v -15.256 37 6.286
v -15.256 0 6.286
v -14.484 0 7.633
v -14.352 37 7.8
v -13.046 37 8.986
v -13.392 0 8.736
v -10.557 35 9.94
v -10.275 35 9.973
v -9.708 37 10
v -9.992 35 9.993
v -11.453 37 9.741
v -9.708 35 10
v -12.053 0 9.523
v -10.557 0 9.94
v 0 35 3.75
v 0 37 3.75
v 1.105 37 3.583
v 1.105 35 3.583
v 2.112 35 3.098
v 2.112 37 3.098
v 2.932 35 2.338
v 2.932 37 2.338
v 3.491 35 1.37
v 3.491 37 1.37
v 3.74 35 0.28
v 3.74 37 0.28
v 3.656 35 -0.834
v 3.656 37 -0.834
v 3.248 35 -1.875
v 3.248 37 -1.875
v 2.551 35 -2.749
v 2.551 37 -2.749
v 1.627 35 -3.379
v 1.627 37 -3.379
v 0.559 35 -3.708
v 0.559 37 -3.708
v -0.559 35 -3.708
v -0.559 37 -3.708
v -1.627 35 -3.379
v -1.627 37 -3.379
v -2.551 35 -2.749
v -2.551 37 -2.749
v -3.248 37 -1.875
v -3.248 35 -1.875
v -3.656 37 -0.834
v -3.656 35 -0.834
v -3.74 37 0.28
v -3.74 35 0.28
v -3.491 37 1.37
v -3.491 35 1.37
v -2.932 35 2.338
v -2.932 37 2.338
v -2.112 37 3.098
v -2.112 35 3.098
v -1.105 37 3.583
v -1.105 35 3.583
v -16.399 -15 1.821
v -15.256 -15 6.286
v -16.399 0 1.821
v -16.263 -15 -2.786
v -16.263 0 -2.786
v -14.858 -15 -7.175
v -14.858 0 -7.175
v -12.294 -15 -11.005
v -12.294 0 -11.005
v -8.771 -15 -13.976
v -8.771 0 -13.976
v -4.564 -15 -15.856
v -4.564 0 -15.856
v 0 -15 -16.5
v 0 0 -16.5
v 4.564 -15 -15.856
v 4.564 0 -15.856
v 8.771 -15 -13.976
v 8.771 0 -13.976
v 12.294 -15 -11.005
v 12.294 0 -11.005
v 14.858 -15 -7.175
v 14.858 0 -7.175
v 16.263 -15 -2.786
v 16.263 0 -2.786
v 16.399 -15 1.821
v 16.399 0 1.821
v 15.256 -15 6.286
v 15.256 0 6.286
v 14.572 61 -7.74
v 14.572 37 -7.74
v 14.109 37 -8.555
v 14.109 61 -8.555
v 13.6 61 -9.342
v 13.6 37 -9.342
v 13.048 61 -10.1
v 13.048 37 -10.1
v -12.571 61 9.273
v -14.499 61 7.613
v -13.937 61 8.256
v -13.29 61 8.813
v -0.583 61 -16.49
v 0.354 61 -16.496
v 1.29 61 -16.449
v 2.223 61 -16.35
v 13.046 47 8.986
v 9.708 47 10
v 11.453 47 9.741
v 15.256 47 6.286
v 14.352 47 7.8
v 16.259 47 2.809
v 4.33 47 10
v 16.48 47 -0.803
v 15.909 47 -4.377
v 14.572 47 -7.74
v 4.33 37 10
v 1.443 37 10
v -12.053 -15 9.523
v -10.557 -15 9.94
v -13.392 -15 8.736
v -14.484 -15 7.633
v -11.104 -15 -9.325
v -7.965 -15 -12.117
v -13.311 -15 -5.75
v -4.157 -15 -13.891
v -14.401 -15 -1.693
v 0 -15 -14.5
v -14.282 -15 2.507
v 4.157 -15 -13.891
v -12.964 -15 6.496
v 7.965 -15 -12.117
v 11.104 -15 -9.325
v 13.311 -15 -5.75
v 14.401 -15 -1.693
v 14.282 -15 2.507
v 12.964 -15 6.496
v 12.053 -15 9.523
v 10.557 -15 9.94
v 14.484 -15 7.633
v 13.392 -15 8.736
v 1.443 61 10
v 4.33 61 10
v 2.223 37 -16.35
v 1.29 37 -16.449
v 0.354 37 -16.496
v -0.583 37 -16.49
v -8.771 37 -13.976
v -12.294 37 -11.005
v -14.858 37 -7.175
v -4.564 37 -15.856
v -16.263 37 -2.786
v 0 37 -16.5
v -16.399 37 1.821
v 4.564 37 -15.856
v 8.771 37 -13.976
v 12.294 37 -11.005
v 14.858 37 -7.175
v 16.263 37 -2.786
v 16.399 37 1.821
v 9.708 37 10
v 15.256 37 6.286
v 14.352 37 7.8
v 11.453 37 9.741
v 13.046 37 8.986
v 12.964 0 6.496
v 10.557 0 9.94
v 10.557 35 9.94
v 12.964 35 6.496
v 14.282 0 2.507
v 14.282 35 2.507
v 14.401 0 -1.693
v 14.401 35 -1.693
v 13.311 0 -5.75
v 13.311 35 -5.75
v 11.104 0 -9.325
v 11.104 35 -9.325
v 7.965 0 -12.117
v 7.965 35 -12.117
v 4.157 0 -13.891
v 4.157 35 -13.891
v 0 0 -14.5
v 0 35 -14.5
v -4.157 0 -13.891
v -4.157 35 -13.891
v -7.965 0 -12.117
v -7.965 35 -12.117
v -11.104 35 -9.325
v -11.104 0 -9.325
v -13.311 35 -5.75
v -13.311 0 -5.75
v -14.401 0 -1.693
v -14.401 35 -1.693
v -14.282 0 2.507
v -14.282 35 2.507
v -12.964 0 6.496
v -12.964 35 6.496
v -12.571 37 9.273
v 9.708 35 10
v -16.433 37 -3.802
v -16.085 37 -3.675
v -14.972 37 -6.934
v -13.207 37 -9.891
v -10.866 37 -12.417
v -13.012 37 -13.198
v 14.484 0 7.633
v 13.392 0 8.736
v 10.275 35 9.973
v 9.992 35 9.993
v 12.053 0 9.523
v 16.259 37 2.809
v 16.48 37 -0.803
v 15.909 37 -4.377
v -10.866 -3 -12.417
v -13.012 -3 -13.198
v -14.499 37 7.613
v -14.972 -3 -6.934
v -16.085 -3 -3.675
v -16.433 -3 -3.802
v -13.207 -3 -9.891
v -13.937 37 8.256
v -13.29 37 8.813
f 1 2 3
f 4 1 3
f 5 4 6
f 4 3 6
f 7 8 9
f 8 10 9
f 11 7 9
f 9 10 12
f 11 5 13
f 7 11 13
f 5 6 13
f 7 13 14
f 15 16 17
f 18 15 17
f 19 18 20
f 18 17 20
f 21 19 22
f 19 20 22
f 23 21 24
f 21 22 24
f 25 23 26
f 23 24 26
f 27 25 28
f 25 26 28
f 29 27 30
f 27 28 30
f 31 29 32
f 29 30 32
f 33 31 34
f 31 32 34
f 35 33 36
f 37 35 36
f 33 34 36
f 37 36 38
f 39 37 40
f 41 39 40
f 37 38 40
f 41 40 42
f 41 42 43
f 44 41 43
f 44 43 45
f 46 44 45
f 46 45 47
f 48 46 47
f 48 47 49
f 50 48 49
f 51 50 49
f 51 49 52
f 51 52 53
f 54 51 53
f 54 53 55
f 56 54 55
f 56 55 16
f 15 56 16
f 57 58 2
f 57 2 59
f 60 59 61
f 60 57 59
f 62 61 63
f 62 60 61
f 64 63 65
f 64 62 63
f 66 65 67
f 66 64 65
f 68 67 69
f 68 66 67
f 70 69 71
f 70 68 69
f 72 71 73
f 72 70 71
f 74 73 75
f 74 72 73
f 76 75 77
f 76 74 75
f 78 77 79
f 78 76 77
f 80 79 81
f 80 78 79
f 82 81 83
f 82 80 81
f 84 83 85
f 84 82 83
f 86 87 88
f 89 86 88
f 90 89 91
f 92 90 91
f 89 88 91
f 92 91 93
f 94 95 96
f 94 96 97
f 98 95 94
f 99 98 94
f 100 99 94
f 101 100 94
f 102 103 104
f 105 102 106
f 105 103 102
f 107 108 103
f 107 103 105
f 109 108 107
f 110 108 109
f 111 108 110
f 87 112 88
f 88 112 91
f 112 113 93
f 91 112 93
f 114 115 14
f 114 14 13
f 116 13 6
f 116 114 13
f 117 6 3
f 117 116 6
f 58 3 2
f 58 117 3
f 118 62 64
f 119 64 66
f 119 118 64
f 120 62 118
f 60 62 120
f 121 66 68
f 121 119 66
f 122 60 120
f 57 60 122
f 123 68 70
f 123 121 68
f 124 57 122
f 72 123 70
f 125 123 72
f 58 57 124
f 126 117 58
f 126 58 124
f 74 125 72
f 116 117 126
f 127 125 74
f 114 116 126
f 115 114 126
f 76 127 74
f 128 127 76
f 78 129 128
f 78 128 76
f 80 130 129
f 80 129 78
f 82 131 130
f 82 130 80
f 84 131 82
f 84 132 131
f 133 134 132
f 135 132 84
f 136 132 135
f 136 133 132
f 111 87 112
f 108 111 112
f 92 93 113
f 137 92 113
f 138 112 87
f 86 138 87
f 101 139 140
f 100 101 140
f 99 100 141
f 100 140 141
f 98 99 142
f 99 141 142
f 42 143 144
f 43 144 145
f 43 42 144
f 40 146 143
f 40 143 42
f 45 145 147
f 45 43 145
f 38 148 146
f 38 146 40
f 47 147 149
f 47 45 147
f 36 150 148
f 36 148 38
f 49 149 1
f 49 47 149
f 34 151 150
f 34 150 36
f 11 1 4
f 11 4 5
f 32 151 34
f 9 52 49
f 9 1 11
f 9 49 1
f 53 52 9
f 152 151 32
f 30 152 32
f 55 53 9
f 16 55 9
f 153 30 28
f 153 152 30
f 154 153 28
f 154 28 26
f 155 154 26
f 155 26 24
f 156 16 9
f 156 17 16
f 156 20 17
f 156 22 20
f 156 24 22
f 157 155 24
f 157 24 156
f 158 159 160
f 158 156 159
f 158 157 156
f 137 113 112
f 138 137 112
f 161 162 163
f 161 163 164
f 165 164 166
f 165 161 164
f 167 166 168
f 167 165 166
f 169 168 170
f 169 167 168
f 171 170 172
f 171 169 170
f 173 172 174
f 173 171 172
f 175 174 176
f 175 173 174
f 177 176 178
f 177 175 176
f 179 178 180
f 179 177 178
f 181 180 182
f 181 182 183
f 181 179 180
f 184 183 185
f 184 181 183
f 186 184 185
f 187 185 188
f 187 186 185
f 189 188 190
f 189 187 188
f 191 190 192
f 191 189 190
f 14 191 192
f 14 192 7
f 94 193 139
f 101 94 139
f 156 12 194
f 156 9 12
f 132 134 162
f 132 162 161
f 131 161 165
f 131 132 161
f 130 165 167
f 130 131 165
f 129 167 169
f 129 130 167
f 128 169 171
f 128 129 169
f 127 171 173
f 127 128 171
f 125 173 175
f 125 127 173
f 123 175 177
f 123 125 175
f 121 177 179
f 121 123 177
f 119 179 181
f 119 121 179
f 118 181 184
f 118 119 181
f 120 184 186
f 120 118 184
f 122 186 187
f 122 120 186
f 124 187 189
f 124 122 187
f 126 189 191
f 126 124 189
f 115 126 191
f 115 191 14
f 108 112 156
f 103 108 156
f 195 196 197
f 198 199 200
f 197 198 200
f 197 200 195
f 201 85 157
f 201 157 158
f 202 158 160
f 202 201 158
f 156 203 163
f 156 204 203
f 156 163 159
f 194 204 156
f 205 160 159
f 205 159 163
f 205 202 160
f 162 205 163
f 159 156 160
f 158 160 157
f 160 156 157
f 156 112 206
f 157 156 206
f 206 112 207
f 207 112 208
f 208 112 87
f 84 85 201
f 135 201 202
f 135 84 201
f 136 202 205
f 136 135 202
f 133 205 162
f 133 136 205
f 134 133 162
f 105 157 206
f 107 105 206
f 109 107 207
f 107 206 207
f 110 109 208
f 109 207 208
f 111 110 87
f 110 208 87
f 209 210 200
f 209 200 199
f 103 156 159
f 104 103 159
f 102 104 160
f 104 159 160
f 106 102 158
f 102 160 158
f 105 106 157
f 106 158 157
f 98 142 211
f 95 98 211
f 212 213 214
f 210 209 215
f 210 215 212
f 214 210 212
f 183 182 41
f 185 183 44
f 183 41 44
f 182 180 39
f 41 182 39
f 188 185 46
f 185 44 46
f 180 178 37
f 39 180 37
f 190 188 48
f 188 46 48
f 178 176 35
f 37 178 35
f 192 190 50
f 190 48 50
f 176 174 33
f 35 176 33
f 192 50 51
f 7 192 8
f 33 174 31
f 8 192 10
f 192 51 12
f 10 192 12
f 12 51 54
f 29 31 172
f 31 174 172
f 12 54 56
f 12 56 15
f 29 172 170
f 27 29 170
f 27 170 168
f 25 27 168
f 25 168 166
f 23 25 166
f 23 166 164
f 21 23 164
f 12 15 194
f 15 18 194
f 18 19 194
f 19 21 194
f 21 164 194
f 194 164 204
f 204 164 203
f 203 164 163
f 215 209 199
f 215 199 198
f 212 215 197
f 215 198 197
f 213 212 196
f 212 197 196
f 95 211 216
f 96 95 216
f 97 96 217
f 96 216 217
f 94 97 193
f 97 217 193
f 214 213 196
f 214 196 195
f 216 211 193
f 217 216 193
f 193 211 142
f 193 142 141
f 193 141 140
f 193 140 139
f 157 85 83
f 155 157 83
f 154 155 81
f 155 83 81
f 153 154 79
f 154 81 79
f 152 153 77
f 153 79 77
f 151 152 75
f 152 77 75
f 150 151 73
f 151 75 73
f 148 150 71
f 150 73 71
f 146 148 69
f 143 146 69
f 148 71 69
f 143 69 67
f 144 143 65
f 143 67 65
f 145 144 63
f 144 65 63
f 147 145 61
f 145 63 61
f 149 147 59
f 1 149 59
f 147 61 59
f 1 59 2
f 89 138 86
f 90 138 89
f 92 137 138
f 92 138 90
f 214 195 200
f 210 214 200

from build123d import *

# Parameters (mm, degrees)
SKETCH_1_R          = 16.5
SKETCH_1_R_2        = 14.5
EXTRUDE_1_DEPTH     = 35
SKETCH_3_R          = 16.5
EXTRUDE_2_DEPTH     = 2
SKETCH_4_W          = 78.350079852
SKETCH_4_H          = 91.802514566
CUT_EXTRUDE_1_DEPTH = 49.40970977
CUT_EXTRUDE_2_REACH = 45.744
SKETCH_5_R          = 3.75
FILLET_1_R          = 6
EXTRUDE_3_DEPTH     = 24
EXTRUDE_3_2_DEPTH   = 24
EXTRUDE_7_DEPTH     = 10
EXTRUDE_START       = 15
EXTRUDE_8_DEPTH     = 15
EXTRUDE_10_DEPTH    = 40


with BuildPart() as part:
    # 草图1 → 凸台-拉伸1 (new body)
    with BuildSketch(Plane(origin=(0, 0, 0), x_dir=(1, 0, 0), z_dir=(0, 1, 0))):
        with Locations(Location((0, 0, 0), (0, 0, 270))):
            Circle(SKETCH_1_R)
        with Locations(Location((0, 0, 0), (0, 0, 270))):
            Circle(SKETCH_1_R_2, mode=Mode.SUBTRACT)
    extrude(amount=EXTRUDE_1_DEPTH)

    # 草图3 → 凸台-拉伸2 (add)
    with BuildSketch(Plane(origin=(0, 35, 0), x_dir=(1, 0, 0), z_dir=(0, 1, 0))):
        with Locations(Location((0, 0, 0), (0, 0, 270))):
            Circle(SKETCH_3_R)
    extrude(amount=EXTRUDE_2_DEPTH)

    # 草图4 → 切除-拉伸1 (cut, through all)
    with BuildSketch(Plane.XY.offset(10)):
        with Locations((-10.760491613, -6.179419868)):
            Rectangle(SKETCH_4_W, SKETCH_4_H)
    extrude(amount=CUT_EXTRUDE_1_DEPTH, mode=Mode.SUBTRACT)

    # 草图5 → 切除-拉伸2 (cut, up to next)
    with BuildSketch(Plane(origin=(0, 37, 0), x_dir=(1, 0, 0), z_dir=(0, 1, 0)), mode=Mode.PRIVATE) as cut_extrude_2_sk1:
        with Locations(Location((0, 0, 0), (0, 0, 270))):
            Circle(SKETCH_5_R)
    cut_extrude_2_tool1 = extrude(cut_extrude_2_sk1.sketch, amount=-CUT_EXTRUDE_2_REACH, mode=Mode.PRIVATE) & part.part
    add(cut_extrude_2_tool1.solids().sort_by_distance((0, 37, 0))[0], mode=Mode.SUBTRACT)

    # 圆角1
    fillet_1_edges = [part.edges().sort_by_distance(p)[0] for p in [
        (13.124404748, 18.5, 10),
        (-13.124404748, 18.5, 10),
    ]]
    fillet(fillet_1_edges, radius=FILLET_1_R)

    # 草图10 → 凸台-拉伸8 (add)
    with BuildSketch(Plane.XZ.offset(EXTRUDE_START)):
        with BuildLine():
            ThreePointArc((-15.255811873, 6.285714286), (0, -16.5), (15.255811873, 6.285714286))
            ThreePointArc((15.255811873, 6.285714286), (13.391521243, 8.736398226), (10.557154474, 9.939642318))
            ThreePointArc((10.557154474, 9.939642318), (0, -14.5), (-10.557154474, 9.939642318))
            ThreePointArc((-10.557154474, 9.939642318), (-13.391521243, 8.736398226), (-15.255811873, 6.285714286))
        make_face()
    extrude(amount=-EXTRUDE_8_DEPTH)


with BuildPart() as body_2:
    # 草图6 → 凸台-拉伸3 (new body)
    with BuildSketch(Plane(origin=(0, 37, 0), x_dir=(1, 0, 0), z_dir=(0, 1, 0))):
        with BuildLine():
            Line((13.047897801, 10.099621923), (1.443375673, -10))
            Line((1.443375673, -10), (4.330127019, -10))
            Line((4.330127019, -10), (14.5721397, 7.739686335))
            ThreePointArc((14.5721397, 7.739686335), (13.860337004, 8.952153826), (13.047897801, 10.099621923))
        make_face()
    extrude(amount=EXTRUDE_3_DEPTH)


with BuildPart() as body_3:
    # 草图6 → Extrude 3 2 (new body)
    with BuildSketch(Plane(origin=(0, 37, 0), x_dir=(1, 0, 0), z_dir=(0, 1, 0))):
        with BuildLine():
            Line((-0.583304866, 16.489686335), (-14.498767089, -7.612601246))
            ThreePointArc((-14.498767089, -7.612601246), (-13.623792058, -8.546260307), (-12.570735662, -9.273152854))
            Line((-12.570735662, -9.273152854), (2.222580253, 16.349621923))
            ThreePointArc((2.222580253, 16.349621923), (0.82262413, 16.479480864), (-0.583304866, 16.489686335))
        make_face()
    extrude(amount=EXTRUDE_3_2_DEPTH)


with BuildPart() as body_4:
    # 草图9 → 凸台-拉伸7 (new body)
    with BuildSketch(Plane(origin=(0, 37, 0), x_dir=(1, 0, 0), z_dir=(0, 1, 0))):
        with BuildLine():
            Line((4.330127019, -10), (9.708243919, -10))
            ThreePointArc((9.708243919, -10), (13.046335761, -8.985693819), (15.255811873, -6.285714286))
            ThreePointArc((15.255811873, -6.285714286), (16.480432015, 0.803343383), (14.5721397, 7.739686335))
            Line((14.5721397, 7.739686335), (4.330127019, -10))
        make_face()
    extrude(amount=EXTRUDE_7_DEPTH)


with BuildPart() as body_5:
    # 草图12 → 凸台-拉伸10 (new body)
    with BuildSketch(Plane(origin=(0, 37, 0), x_dir=(1, 0, 0), z_dir=(0, 1, 0))):
        with BuildLine():
            Line((-16.432532581, 3.801536896), (-13.012331148, 13.198463104))
            Line((-13.012331148, 13.198463104), (-10.865728221, 12.417163534))
            ThreePointArc((-10.865728221, 12.417163534), (-14.166768538, 8.458881084), (-16.085482597, 3.675221032))
            Line((-16.085482597, 3.675221032), (-16.432532581, 3.801536896))
        make_face()
    extrude(amount=-EXTRUDE_10_DEPTH)


solid = Compound([part.part, body_2.part, body_3.part, body_4.part, body_5.part])
